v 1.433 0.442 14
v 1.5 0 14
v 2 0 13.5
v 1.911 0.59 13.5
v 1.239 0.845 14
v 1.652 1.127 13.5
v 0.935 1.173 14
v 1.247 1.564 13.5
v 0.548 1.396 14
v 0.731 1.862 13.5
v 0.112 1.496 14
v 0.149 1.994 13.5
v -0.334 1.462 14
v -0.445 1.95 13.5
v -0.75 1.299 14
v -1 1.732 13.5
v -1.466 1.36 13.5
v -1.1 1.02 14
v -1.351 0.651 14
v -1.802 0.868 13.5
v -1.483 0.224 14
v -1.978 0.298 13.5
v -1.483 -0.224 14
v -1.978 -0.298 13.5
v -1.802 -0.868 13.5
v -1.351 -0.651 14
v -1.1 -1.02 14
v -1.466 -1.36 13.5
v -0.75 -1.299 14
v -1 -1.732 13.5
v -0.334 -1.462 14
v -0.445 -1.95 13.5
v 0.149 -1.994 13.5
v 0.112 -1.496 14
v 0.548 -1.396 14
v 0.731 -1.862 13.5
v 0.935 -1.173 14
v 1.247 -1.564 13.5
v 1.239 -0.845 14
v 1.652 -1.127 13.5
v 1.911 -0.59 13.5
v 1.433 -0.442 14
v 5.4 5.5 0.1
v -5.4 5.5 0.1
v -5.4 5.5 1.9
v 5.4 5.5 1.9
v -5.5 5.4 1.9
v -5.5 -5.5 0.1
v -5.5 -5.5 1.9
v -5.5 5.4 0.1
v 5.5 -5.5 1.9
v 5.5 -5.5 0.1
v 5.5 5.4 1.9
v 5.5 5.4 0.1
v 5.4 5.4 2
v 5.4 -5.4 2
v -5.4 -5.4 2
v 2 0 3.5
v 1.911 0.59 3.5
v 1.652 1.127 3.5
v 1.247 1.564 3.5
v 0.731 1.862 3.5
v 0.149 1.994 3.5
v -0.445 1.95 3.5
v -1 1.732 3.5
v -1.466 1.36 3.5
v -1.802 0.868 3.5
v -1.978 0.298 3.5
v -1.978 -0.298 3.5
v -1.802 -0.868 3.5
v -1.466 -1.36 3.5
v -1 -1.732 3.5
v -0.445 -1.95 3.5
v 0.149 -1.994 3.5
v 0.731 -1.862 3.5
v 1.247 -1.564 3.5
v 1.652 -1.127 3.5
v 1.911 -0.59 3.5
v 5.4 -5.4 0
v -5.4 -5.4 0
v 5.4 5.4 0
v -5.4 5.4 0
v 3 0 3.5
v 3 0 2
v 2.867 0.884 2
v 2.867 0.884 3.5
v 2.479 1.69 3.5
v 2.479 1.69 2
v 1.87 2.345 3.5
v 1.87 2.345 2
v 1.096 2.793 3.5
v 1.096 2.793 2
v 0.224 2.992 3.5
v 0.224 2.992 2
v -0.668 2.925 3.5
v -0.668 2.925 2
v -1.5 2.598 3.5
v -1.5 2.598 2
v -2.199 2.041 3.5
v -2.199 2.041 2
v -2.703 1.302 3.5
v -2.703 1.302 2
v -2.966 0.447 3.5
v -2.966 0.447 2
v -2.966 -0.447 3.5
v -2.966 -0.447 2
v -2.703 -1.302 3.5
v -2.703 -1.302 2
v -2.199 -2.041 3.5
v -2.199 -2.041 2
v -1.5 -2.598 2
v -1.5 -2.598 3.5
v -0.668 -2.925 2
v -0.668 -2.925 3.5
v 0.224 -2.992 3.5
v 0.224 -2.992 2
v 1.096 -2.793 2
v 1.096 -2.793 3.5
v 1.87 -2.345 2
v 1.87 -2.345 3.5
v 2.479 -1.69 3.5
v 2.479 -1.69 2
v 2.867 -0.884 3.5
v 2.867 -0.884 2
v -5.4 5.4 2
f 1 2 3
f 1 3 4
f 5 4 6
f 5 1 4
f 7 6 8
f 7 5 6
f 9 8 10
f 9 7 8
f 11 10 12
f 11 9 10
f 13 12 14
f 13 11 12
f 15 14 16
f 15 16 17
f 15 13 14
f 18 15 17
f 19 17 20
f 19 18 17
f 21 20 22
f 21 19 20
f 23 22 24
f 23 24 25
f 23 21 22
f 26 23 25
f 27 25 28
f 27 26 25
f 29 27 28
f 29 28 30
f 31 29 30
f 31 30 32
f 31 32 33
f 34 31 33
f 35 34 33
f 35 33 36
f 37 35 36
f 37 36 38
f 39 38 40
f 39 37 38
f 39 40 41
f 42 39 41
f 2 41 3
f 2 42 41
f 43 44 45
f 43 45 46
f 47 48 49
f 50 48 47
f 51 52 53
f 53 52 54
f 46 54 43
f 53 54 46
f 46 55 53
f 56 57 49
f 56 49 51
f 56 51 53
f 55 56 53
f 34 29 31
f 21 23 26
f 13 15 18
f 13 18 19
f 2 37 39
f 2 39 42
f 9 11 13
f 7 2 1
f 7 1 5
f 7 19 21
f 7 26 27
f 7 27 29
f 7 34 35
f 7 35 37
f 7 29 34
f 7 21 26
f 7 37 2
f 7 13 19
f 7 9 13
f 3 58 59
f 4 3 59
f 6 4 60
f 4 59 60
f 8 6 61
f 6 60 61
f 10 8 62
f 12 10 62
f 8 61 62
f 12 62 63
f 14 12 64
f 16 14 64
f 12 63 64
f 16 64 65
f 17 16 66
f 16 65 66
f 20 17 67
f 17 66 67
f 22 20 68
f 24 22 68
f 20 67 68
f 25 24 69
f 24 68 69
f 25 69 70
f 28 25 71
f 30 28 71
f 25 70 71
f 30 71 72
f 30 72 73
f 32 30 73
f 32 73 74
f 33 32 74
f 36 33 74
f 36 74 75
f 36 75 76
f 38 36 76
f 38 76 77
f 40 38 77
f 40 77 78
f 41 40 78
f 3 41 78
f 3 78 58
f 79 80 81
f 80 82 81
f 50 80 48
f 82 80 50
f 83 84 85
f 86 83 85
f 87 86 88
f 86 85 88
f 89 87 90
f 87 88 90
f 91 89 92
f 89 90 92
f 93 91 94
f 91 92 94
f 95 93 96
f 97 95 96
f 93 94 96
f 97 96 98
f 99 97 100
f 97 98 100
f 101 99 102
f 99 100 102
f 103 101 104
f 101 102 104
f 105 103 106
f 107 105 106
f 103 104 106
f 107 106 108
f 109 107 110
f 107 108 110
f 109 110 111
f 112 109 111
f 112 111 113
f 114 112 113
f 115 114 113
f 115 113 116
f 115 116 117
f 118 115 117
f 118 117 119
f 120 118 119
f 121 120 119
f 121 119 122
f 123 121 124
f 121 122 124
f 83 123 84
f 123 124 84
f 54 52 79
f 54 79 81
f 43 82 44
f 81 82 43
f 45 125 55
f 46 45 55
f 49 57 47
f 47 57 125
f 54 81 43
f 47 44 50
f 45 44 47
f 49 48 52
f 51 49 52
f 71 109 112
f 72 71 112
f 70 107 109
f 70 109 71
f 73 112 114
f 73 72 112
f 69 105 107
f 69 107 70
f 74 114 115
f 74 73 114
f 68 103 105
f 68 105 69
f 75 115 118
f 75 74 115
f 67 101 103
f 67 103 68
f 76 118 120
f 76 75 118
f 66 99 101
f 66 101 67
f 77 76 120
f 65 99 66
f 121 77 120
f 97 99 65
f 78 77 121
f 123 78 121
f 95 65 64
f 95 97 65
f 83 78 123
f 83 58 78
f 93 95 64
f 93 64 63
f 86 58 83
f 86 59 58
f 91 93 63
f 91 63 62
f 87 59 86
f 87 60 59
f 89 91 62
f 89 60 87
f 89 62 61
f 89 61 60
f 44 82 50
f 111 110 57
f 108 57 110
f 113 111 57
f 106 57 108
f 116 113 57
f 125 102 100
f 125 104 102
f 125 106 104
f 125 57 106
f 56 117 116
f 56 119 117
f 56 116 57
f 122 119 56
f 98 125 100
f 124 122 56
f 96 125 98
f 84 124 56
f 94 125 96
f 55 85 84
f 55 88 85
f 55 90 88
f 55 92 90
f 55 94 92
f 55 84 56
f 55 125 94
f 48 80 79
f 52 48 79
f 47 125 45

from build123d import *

# Parameters (mm, degrees)
SKETCH1_W           = 11
SKETCH1_H           = 11
BOSS_EXTRUDE1_DEPTH = 2
SKETCH2_R           = 2
BOSS_EXTRUDE2_DEPTH = 12
CHAMFER1_SIZE       = 0.1
SKETCH3_R           = 3
BOSS_EXTRUDE3_DEPTH = 1.5
CHAMFER2_SIZE       = 0.5


with BuildPart() as part:
    # Sketch1 → Boss-Extrude1 (new body)
    with BuildSketch(Plane.XY):
        Rectangle(SKETCH1_W, SKETCH1_H)
    extrude(amount=BOSS_EXTRUDE1_DEPTH)

    # Sketch2 → Boss-Extrude2 (add)
    with BuildSketch(Plane.XY.offset(2)):
        Circle(SKETCH2_R)
    extrude(amount=BOSS_EXTRUDE2_DEPTH)

    # Chamfer1
    chamfer1_edges = [part.edges().sort_by_distance(p)[0] for p in [
        (-5.5, 0, 2),
        (0, -5.5, 2),
        (5.5, 0, 2),
        (0, -5.5, 0),
        (-5.5, 0, 0),
        (0, 5.5, 0),
        (5.5, 0, 0),
        (0, 5.5, 2),
        (-5.5, 5.5, 1),
        (5.5, 5.5, 1),
    ]]
    chamfer(chamfer1_edges, length=CHAMFER1_SIZE)

    # Sketch3 → Boss-Extrude3 (add)
    with BuildSketch(Plane.XY.offset(2)):
        Circle(SKETCH3_R)
    extrude(amount=BOSS_EXTRUDE3_DEPTH)

    # Chamfer2
    chamfer2_edges = [part.edges().sort_by_distance(p)[0] for p in [
        (-2, 0, 14),
    ]]
    chamfer(chamfer2_edges, length=CHAMFER2_SIZE)


solid = part.part
